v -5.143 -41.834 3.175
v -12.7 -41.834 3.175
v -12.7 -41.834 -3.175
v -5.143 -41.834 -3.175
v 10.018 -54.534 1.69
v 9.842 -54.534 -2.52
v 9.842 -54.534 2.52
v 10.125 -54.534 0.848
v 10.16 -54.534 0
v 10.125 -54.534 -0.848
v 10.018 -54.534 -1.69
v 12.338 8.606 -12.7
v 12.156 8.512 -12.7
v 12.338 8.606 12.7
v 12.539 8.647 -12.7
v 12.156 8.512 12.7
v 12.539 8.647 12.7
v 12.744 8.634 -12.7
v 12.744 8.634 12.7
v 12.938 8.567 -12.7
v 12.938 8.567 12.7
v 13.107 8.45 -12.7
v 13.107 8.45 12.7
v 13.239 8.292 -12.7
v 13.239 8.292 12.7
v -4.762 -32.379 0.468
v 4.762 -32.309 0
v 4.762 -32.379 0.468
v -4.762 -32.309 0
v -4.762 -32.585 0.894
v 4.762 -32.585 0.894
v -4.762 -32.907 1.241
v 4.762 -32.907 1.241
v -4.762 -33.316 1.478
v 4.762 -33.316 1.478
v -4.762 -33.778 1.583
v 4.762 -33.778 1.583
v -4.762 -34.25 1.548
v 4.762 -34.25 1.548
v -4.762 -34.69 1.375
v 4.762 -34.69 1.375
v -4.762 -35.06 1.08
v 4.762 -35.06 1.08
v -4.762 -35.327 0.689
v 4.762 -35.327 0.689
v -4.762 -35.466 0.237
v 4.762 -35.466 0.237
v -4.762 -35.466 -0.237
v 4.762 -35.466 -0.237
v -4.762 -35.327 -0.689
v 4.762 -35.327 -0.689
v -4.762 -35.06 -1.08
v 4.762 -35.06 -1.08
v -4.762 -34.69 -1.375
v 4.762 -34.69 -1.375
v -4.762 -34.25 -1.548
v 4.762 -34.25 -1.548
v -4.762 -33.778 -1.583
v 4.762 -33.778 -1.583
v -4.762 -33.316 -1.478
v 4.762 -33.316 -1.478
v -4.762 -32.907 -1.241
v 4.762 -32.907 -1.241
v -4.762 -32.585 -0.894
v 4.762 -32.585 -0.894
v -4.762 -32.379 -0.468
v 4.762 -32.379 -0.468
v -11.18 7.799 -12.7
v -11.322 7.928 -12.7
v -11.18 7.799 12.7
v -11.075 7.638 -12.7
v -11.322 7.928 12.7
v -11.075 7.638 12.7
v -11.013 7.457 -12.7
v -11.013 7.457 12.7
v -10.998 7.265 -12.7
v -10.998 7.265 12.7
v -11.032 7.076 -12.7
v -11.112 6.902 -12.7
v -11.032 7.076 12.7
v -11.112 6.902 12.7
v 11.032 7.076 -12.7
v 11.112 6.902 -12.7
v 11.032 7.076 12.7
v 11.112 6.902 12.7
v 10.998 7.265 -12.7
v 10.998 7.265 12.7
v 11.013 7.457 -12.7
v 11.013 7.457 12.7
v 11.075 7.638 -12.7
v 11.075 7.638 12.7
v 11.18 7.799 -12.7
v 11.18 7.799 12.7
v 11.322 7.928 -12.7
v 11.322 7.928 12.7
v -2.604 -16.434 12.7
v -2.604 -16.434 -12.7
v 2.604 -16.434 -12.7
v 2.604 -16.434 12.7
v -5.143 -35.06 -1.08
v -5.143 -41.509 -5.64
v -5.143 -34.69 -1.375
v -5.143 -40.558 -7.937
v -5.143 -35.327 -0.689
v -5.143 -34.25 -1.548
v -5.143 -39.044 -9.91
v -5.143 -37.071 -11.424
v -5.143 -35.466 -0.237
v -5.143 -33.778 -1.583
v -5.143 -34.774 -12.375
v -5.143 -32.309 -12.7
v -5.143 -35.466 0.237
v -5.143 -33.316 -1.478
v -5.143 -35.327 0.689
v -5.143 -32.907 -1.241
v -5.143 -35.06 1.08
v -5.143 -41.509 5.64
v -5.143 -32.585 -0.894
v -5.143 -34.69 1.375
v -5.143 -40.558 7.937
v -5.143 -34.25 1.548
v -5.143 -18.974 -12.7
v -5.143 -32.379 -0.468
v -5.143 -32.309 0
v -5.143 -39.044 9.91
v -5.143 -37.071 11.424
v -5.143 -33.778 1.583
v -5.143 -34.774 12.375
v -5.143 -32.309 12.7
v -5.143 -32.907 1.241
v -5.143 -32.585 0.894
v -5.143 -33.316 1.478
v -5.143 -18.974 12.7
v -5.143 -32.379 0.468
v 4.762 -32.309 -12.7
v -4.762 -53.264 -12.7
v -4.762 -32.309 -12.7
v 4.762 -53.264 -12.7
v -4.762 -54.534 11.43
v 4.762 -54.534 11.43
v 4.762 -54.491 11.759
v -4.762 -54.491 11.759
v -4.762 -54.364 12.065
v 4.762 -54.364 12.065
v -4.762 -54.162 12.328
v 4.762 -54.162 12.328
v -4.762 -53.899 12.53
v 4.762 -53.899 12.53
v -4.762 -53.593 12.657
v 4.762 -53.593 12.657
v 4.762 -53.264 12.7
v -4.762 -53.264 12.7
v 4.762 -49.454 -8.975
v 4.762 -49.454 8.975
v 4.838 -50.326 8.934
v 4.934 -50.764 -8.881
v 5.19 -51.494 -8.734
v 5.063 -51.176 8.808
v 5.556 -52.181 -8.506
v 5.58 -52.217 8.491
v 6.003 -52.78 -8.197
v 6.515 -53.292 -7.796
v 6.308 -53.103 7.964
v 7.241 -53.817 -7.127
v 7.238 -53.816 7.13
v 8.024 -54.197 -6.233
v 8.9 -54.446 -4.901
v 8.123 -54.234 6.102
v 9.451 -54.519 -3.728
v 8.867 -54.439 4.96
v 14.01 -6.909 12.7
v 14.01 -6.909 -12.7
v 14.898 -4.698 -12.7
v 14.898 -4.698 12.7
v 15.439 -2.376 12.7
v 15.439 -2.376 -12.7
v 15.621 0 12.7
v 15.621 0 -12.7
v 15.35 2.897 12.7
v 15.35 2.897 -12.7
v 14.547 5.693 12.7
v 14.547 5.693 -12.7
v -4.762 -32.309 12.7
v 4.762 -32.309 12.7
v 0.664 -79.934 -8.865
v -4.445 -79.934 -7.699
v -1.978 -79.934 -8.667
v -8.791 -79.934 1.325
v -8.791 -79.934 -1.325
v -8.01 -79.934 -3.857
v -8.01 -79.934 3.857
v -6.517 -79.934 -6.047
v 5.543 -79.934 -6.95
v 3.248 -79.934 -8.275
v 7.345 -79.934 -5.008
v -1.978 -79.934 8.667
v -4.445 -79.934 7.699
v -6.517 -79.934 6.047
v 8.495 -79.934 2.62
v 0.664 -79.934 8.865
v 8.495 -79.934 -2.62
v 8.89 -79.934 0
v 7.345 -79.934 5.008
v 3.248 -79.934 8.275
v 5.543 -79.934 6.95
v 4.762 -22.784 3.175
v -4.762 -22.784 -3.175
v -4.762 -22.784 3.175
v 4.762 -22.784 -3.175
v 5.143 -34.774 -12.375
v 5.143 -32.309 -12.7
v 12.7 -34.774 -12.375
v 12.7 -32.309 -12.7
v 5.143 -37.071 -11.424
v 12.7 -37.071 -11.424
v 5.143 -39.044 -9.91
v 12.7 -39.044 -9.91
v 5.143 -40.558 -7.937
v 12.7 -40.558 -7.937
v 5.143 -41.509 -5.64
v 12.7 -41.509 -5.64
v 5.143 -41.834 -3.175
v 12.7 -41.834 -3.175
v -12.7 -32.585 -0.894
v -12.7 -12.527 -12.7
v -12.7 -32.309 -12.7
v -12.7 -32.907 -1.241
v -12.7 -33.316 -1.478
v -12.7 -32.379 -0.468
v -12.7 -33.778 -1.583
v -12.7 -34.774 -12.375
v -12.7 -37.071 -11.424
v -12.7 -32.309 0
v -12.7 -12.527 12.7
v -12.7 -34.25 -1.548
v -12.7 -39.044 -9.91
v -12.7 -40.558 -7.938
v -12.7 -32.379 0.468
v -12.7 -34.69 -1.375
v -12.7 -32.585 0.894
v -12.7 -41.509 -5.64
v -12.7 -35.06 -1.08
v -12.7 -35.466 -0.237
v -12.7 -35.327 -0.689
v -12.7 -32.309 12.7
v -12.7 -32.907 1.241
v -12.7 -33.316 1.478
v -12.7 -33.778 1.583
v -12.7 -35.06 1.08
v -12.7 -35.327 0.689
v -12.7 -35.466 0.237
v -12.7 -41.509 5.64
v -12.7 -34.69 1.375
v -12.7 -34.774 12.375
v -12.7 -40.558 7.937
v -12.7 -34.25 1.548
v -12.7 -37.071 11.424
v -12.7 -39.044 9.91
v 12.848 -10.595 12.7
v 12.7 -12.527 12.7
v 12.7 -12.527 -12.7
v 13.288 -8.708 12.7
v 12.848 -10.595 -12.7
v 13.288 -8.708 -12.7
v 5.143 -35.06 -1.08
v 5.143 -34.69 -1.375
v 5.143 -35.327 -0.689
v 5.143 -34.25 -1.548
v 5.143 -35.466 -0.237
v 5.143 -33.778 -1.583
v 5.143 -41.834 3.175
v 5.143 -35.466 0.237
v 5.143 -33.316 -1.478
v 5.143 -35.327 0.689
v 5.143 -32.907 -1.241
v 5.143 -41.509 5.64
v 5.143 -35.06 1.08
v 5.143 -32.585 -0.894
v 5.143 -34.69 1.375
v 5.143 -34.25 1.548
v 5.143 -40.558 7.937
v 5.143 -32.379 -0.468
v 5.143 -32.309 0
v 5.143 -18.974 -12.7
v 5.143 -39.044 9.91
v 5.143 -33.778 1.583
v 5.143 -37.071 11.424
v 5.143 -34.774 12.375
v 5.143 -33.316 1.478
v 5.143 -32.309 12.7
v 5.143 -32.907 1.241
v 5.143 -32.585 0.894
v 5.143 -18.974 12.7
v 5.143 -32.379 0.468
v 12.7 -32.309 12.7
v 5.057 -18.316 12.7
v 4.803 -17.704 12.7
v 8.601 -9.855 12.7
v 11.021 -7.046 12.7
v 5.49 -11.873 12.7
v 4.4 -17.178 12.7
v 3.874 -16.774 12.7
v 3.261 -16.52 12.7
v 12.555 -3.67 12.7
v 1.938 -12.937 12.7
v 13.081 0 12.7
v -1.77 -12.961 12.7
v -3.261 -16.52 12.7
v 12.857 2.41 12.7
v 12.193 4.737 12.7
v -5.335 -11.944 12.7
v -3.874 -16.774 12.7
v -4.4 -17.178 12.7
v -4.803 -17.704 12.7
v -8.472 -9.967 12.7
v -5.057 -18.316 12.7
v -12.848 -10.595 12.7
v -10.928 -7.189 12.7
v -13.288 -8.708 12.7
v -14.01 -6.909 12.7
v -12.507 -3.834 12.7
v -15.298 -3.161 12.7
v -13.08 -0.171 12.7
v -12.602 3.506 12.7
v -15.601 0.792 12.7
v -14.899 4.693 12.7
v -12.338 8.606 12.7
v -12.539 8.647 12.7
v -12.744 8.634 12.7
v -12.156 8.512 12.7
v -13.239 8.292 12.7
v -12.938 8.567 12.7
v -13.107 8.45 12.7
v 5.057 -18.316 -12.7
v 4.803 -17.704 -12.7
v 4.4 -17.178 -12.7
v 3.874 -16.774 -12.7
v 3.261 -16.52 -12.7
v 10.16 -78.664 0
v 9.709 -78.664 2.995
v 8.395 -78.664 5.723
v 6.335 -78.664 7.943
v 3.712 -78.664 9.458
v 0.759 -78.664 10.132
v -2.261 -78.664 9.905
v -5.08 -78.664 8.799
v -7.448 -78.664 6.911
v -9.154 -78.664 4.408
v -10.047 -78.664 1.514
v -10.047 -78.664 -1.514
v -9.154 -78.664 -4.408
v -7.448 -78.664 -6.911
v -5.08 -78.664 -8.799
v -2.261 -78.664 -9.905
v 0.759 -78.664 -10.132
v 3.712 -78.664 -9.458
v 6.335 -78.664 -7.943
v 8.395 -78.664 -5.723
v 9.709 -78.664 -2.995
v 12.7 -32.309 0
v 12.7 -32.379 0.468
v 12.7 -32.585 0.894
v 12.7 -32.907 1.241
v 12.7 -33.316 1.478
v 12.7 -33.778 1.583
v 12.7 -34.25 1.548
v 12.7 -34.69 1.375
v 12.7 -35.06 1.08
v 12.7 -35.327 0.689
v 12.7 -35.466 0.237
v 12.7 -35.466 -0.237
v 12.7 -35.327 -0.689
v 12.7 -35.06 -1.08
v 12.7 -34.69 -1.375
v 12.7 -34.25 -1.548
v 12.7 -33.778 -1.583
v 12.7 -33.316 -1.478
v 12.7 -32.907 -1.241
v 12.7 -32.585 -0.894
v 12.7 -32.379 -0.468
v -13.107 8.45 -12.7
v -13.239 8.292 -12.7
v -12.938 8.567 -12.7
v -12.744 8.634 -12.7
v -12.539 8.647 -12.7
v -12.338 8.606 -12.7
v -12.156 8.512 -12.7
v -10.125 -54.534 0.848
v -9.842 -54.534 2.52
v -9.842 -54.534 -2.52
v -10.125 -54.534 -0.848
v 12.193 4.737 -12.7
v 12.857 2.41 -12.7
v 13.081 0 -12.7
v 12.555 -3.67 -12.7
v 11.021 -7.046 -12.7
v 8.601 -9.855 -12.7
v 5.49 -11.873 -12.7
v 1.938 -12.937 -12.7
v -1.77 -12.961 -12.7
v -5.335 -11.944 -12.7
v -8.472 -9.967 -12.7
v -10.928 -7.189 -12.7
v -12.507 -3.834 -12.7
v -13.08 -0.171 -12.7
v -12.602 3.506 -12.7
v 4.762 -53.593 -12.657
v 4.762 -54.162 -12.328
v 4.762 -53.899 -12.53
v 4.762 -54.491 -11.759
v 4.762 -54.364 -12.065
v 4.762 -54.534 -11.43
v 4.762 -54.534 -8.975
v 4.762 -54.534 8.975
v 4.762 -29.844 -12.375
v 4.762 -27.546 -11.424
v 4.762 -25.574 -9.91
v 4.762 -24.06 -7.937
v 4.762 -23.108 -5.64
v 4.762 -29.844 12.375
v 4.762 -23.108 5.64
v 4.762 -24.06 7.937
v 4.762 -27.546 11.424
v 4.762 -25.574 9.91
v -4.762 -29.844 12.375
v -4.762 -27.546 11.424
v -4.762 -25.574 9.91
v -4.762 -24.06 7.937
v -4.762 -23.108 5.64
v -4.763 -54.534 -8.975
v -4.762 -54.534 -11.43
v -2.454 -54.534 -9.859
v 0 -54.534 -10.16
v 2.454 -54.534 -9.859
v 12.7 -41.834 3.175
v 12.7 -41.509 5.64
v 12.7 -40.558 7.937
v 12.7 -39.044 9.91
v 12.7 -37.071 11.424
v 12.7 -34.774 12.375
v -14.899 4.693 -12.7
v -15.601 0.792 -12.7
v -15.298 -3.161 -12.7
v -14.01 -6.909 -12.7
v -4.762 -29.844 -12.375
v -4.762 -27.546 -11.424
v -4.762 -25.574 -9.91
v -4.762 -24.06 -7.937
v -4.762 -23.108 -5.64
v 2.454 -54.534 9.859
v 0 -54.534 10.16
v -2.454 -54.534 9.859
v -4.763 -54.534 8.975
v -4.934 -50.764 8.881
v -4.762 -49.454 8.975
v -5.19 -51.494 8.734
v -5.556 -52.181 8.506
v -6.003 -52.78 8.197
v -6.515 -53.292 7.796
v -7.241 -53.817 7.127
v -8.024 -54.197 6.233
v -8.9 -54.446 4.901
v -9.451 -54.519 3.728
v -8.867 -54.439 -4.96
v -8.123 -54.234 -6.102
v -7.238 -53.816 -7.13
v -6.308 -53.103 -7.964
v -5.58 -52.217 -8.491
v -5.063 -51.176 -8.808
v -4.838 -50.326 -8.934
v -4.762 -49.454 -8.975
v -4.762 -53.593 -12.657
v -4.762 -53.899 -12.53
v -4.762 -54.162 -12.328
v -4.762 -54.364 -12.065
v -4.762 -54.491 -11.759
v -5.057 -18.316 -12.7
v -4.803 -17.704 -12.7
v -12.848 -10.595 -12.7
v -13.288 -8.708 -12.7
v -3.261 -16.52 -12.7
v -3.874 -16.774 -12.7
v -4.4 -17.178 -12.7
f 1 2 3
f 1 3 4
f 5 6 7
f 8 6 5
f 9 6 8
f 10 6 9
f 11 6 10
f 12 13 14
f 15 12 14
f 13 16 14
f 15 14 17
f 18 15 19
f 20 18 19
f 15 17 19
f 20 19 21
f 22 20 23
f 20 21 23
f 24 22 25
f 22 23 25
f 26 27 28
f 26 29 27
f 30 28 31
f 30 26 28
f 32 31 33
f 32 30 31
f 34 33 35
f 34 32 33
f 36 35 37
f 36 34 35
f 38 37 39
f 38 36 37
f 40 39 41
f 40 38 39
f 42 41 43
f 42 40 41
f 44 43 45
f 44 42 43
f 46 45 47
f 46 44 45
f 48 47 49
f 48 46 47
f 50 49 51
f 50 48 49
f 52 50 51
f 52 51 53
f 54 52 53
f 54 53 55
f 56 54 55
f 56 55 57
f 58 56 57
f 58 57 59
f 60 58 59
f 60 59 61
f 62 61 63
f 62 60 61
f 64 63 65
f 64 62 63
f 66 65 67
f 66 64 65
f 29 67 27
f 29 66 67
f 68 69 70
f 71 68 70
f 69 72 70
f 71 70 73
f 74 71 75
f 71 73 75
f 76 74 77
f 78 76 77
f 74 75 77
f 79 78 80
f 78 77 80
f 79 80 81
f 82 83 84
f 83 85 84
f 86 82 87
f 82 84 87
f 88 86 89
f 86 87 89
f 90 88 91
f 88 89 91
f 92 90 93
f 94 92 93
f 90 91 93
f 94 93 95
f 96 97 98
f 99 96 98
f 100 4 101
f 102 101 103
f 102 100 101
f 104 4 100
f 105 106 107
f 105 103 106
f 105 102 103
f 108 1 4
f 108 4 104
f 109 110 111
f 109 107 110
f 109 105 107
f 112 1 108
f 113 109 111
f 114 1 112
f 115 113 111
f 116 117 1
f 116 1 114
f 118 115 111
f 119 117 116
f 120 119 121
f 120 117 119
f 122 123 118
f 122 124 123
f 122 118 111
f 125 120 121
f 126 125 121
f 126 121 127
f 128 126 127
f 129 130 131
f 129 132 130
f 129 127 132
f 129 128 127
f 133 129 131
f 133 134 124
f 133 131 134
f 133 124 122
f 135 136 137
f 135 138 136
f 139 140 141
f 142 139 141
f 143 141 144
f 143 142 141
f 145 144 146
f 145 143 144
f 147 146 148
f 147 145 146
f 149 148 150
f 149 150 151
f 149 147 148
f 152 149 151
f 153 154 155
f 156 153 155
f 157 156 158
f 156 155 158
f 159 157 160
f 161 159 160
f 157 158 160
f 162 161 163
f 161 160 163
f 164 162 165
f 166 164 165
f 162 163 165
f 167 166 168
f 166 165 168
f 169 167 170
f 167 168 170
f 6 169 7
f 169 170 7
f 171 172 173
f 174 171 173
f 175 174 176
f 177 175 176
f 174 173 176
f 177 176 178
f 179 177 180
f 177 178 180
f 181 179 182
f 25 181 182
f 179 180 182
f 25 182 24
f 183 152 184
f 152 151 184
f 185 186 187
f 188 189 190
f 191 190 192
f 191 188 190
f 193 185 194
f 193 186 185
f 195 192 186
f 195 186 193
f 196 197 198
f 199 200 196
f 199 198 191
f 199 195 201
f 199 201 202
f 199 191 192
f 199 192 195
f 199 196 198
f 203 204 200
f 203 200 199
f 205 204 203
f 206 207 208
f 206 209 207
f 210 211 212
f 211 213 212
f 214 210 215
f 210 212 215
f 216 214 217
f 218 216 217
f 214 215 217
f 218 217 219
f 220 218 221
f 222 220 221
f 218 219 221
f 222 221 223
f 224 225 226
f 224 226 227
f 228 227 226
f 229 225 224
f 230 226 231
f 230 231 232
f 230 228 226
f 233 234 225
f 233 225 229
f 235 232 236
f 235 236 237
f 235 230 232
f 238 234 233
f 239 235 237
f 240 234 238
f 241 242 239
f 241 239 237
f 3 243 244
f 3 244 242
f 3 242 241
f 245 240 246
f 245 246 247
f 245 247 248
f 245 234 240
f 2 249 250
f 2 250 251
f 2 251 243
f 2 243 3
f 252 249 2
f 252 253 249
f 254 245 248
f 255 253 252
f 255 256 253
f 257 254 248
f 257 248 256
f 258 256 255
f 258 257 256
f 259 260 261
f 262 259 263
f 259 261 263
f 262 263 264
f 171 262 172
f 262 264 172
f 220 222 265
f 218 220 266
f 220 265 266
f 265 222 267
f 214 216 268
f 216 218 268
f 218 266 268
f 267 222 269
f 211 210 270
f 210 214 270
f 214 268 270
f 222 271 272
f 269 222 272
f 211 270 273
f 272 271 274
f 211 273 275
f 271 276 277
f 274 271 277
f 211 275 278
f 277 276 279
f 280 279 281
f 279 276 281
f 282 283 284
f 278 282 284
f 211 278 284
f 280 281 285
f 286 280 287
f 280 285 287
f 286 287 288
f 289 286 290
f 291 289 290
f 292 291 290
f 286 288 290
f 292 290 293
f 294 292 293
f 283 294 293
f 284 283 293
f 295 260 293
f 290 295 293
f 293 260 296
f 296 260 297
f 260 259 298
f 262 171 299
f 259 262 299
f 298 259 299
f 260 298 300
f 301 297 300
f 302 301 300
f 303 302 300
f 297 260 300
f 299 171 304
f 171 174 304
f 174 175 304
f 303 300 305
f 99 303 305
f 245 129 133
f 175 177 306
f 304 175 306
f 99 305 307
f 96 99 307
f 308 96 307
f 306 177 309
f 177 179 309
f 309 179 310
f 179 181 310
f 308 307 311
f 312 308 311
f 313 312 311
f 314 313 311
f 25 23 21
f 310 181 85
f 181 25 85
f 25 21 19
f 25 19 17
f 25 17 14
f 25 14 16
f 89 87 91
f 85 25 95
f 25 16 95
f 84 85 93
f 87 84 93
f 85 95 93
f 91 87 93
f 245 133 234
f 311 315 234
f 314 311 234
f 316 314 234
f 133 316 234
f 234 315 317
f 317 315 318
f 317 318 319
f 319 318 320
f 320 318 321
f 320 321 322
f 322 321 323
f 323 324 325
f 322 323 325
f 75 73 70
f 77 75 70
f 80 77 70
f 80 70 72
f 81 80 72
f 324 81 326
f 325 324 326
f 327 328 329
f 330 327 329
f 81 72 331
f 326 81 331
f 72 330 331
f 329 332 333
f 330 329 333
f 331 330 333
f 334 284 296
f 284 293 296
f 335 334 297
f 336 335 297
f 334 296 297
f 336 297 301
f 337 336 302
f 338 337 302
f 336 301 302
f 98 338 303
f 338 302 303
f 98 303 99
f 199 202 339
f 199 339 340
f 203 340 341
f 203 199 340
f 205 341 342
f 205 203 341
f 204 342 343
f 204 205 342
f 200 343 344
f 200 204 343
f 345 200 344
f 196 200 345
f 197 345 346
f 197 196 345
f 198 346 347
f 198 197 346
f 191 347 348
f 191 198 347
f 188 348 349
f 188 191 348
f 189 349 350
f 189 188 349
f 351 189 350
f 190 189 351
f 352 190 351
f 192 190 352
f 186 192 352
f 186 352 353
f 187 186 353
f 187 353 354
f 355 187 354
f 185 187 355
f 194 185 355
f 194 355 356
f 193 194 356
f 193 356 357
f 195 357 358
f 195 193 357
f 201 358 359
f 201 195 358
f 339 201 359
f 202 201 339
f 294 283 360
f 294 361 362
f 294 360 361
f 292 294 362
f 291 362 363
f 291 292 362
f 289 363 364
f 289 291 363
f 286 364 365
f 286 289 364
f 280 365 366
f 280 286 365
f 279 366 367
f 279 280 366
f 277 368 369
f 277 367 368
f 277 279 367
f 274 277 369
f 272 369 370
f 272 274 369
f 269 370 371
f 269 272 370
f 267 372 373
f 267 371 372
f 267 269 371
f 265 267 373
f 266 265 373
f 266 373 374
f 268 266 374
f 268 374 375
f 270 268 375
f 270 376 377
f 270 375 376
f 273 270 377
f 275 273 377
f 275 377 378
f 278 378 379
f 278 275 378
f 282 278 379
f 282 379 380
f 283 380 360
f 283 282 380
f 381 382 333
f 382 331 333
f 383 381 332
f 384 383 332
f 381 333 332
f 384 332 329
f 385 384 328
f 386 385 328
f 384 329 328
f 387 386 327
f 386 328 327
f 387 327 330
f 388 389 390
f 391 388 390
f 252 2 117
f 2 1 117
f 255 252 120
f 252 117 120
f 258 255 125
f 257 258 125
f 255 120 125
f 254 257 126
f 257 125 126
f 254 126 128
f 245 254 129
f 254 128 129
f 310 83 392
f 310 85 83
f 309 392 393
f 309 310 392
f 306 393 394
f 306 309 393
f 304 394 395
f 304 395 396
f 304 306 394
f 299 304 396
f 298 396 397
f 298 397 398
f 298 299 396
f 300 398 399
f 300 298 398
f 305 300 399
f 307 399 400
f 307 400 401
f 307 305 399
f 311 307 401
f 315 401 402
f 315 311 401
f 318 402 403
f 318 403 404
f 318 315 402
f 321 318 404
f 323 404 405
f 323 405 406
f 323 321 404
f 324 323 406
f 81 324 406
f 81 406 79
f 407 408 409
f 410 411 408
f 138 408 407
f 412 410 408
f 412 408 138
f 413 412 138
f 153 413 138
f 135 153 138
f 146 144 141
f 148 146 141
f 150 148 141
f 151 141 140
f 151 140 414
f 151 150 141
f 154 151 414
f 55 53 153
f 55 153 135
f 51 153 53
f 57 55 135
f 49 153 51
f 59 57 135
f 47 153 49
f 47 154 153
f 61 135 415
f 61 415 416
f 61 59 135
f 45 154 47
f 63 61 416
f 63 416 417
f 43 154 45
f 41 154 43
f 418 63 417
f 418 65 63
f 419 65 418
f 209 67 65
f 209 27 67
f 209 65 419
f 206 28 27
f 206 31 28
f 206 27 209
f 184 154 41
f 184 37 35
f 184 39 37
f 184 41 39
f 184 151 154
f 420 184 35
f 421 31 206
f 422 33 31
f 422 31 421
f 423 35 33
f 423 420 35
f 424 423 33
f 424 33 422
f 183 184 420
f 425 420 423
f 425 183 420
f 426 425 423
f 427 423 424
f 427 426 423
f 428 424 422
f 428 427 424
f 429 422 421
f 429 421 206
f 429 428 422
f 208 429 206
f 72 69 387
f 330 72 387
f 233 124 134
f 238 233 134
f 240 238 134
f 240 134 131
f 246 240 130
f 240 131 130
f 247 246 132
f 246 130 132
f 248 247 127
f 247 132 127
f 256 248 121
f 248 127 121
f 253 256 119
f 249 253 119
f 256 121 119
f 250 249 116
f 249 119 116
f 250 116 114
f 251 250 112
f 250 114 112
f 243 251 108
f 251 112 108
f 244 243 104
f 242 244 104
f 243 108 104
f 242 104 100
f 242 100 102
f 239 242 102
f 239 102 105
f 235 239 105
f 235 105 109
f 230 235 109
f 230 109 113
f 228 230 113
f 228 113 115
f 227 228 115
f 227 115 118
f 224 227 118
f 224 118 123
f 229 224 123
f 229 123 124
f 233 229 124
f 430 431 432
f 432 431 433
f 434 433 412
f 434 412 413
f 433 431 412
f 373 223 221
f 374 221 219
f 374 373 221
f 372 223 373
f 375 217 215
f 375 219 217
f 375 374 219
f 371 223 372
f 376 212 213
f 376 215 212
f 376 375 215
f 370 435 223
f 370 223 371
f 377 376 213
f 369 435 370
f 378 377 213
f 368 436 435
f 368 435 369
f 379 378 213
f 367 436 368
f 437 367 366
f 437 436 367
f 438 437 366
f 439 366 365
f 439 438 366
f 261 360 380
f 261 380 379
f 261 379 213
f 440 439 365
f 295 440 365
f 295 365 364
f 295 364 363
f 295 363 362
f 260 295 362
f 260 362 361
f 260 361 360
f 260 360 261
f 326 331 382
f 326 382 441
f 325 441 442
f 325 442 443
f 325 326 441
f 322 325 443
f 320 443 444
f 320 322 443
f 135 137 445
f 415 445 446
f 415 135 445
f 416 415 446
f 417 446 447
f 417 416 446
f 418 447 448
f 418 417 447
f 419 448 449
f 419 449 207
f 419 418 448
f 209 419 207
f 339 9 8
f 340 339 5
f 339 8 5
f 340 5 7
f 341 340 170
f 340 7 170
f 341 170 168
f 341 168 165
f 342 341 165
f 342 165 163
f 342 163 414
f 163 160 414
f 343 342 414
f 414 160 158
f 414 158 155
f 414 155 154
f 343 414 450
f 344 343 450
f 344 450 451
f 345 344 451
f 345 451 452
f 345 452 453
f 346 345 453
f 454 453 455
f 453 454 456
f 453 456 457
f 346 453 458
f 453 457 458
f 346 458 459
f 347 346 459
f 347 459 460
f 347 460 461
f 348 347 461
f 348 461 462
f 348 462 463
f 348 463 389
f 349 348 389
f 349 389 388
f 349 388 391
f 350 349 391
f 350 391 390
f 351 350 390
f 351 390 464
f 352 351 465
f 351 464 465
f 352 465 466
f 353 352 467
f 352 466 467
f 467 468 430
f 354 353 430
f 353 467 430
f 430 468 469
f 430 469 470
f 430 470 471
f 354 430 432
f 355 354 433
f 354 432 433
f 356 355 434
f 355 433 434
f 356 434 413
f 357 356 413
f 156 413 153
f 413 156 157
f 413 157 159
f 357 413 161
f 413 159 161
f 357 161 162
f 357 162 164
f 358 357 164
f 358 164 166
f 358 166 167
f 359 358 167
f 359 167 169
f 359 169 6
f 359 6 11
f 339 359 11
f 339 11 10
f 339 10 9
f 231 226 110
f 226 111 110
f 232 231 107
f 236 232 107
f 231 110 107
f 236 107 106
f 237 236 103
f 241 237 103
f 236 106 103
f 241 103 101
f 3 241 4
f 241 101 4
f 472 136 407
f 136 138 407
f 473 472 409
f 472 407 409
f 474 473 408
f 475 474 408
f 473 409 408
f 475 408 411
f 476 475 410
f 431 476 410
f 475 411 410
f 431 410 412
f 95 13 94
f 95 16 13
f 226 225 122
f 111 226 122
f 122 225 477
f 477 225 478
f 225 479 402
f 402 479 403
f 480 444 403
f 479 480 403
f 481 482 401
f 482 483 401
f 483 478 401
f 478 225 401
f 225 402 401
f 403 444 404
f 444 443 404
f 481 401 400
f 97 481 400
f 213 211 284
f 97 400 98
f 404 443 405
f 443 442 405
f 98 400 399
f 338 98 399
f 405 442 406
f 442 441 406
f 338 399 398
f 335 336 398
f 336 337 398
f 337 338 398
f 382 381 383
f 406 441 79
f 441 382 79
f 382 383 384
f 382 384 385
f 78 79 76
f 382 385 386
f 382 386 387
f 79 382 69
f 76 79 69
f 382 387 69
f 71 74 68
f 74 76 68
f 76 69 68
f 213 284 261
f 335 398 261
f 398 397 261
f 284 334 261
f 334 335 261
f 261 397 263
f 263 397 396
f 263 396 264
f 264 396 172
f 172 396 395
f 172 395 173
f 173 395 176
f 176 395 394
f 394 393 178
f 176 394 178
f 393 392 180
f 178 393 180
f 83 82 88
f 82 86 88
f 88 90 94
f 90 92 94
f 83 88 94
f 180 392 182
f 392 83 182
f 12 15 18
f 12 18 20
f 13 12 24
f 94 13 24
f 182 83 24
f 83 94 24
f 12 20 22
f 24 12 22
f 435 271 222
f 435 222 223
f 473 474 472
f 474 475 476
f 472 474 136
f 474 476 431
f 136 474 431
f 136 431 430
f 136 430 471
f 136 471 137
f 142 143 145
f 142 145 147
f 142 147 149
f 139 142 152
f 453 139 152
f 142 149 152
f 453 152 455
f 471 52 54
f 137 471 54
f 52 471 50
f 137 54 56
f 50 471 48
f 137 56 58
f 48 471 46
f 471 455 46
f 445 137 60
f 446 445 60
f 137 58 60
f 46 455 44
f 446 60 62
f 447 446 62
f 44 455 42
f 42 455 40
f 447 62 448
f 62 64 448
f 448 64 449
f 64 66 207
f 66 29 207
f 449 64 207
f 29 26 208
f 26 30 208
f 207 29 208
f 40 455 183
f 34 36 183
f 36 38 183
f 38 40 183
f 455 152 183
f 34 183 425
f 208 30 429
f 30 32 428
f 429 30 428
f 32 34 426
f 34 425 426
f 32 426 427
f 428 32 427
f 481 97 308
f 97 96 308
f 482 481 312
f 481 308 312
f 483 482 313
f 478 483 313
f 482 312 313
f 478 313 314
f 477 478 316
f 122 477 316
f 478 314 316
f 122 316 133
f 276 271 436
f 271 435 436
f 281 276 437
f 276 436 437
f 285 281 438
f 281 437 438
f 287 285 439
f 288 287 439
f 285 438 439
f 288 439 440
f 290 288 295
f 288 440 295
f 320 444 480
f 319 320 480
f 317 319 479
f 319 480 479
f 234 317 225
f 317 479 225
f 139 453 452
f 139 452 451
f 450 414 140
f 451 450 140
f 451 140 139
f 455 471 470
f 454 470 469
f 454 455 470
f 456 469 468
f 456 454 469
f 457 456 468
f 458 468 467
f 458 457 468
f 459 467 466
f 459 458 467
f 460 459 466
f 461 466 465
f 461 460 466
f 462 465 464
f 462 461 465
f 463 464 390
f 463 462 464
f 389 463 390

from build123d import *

# Parameters (mm, degrees)
F1_DEPTH      = 12.7
F0_W          = 7.5565
F0_H          = 25.4
F2_DEPTH      = 12.7
F3_T1_DEPTH   = 25.4
F3_T3_DEPTH   = 12.7
F3_T5_DEPTH   = 12.7
F4_R          = 0.762
F5_W          = 31.75
F5_H          = 25.4
F5_R          = 1.5875
F6_DEPTH      = 4.7625
F7_DEPTH      = 25.4
F7_DEPTH_BACK = 25.4
F8_R          = 10.16
F9_DEPTH      = 25.4
F10_R         = 9.525
F10_2_R       = 9.525
F11_T4_DEPTH  = 43.3492834119
F11_S5_R      = 10.16
F11_T6_DEPTH  = 23
F11_T10_DEPTH = 43.3492834119
F11_S11_R     = 10.16
F11_T12_DEPTH = 23
F12_R         = 1.27
F13_R         = 2.54
F14_SIZE      = 1.27


# Not quite as in the source:
# - a fillet or chamfer that OpenCascade refuses, or shapes differently, is made with other operations: its cross-section is extruded or revolved along the edge and cut away or added


with BuildPart() as f1:
    # F0 (on Top) → F1 (new body, symmetric)
    with BuildSketch(Plane.XY):
        with BuildLine():
            ThreePointArc((12.7, -9.0953637091), (14.8728333044, -4.7764495705), (15.621, 0))
            ThreePointArc((15.621, 0), (14.8980124876, 4.6973252941), (12.7959740838, 8.9598375122))
            Line((12.7959740838, 8.9598375122), (10.7153278913, 7.5029533639))
            ThreePointArc((10.7153278913, 7.5029533639), (12.4755714327, 3.9335325633), (13.081, 0))
            ThreePointArc((13.081, 0), (-3.9335325633, -12.4755714327), (-10.7153278913, 7.5029533639))
            Line((-10.7153278913, 7.5029533639), (-12.7959740838, 8.9598375122))
            ThreePointArc((-12.7959740838, 8.9598375122), (-15.6207793149, -0.0830336901), (-12.7, -9.0953637091))
            ThreePointArc((-12.7, -9.0953637091), (0, -15.621), (12.7, -9.0953637091))
        make_face()
    extrude(amount=F1_DEPTH, both=True)

    # F0 (on Top) → F2 (join, symmetric)
    with BuildSketch(Plane.XY):
        with BuildLine():
            Line((12.7, -16.4338), (12.7, -9.0953637091))
            ThreePointArc((12.7, -9.0953637091), (0, -15.621), (-12.7, -9.0953637091))
            Line((-12.7, -9.0953637091), (-12.7, -16.4338))
            Line((-12.7, -16.4338), (-5.1435, -16.4338))
            Line((-5.1435, -16.4338), (5.1435, -16.4338))
            Line((5.1435, -16.4338), (12.7, -16.4338))
        make_face()
        with Locations((-8.92175, -29.1338)):
            Rectangle(F0_W, F0_H)
        with Locations((8.92175, -29.1338)):
            Rectangle(F0_W, F0_H)
    extrude(amount=F2_DEPTH, both=True)

    # F3: fillet of radius 12.7 on 3 edges, made by hand

    # F3_s2 → F3_t1 (join)
    with BuildSketch(Plane.XY.offset(-12.7)):
        with BuildLine():
            ThreePointArc((-14.0098654709, -6.9093639714), (-13.0318006864, -9.6427001587), (-12.7, -12.5267330538))
            Line((-12.7, -12.5267330538), (-12.7, -9.0953637091))
            ThreePointArc((-12.7, -9.0953637091), (-13.3995849593, -8.0291197475), (-14.0098654709, -6.9093639714))
        make_face()
    extrude(amount=F3_T1_DEPTH)

    # F3_s4 → F3_t3 (join)
    with BuildSketch(Plane.XY):
        with BuildLine():
            ThreePointArc((14.0098654709, -6.9093639714), (13.0318006864, -9.6427001587), (12.7, -12.5267330538))
            Line((12.7, -12.5267330538), (12.7, -9.0953637091))
            ThreePointArc((12.7, -9.0953637091), (13.3995849593, -8.0291197475), (14.0098654709, -6.9093639714))
        make_face()
    extrude(amount=F3_T3_DEPTH)

    # F3_s6 → F3_t5 (join)
    with BuildSketch(Plane.XY.offset(-12.7)):
        with BuildLine():
            ThreePointArc((12.7, -12.5267330538), (13.0318006864, -9.6427001587), (14.0098654709, -6.9093639714))
            ThreePointArc((14.0098654709, -6.9093639714), (13.3995849593, -8.0291197475), (12.7, -9.0953637091))
            Line((12.7, -9.0953637091), (12.7, -12.5267330538))
        make_face()
    extrude(amount=F3_T5_DEPTH)

    # F4
    f4_edges = [f1.edges().sort_by_distance(p)[0] for p in [
        (-12.795974, 8.959838, 0),
        (-10.715328, 7.502953, -6.35),
        (-10.715328, 7.502953, 6.35),
        (12.795974, 8.959838, 6.35),
        (12.795974, 8.959838, -6.35),
        (10.715328, 7.502953, 6.35),
        (10.715328, 7.502953, -6.35),
    ]]
    fillet(f4_edges, radius=F4_R)

    # F5 (on Right) → F7 (cut, two sides)
    with BuildSketch(Plane.YZ) as f7_sk:
        with Locations((-33.8963, 0)):
            Circle(F5_R)
    extrude(amount=-F7_DEPTH, mode=Mode.SUBTRACT)
    extrude(f7_sk.sketch, amount=F7_DEPTH_BACK, mode=Mode.SUBTRACT)

    # F10
    f10_edges = [f1.edges().sort_by_distance(p)[0] for p in [
        (8.92175, -41.8338, -12.7),
        (-8.92175, -41.8338, -12.7),
        (8.92175, -41.8338, 12.7),
        (-8.92175, -41.8338, 12.7),
    ]]
    fillet(f10_edges, radius=F10_R)

    # F13
    f13_edges = [f1.edges().sort_by_distance(p)[0] for p in [
        (5.1435, -16.4338, 0),
        (-5.1435, -16.4338, 0),
    ]]
    fillet(f13_edges, radius=F13_R)


with BuildPart() as f6:
    # F5 (on Right) → F6 (new body, symmetric)
    with BuildSketch(Plane.YZ):
        with Locations((-38.6588, 0)):
            Rectangle(F5_W, F5_H)
        with Locations((-33.8963, 0)):
            Circle(F5_R, mode=Mode.SUBTRACT)
    extrude(amount=F6_DEPTH, both=True)

    # F8 (on face) → F9 (join)
    with BuildSketch(Plane.XZ.offset(54.5338)):
        Circle(F8_R)
    extrude(amount=F9_DEPTH)

    # F10#2
    f10_2_edges = [f6.edges().sort_by_distance(p)[0] for p in [
        (0, -22.7838, -12.7),
        (0, -22.7838, 12.7),
    ]]
    fillet(f10_2_edges, radius=F10_2_R)

    # F11: fillet of radius 5.08 on 6 edges, made by hand


with BuildPart() as f11_tool2:
    # F11_s3 → F11_t4 (new body)
    with BuildSketch(Plane.XY.offset(21.6746417059)):
        with BuildLine():
            ThreePointArc((-4.7625, -49.4538), (-6.2503975516, -53.0459024484), (-9.8425, -54.5338))
            Line((-9.8425, -54.5338), (-4.7625, -54.5338))
            Line((-4.7625, -54.5338), (-4.7625, -49.4538))
        make_face()
    extrude(amount=-F11_T4_DEPTH)

    # F11_s5 → F11_t6 (intersect, symmetric)
    with BuildSketch(Plane.XZ.offset(52)):
        Circle(F11_S5_R)
    extrude(amount=F11_T6_DEPTH, both=True, mode=Mode.INTERSECT)


with BuildPart() as f6_1:
    add(f6.part)

    # F11_t1: union F11_tool2
    add(f11_tool2.part)


with BuildPart() as f11_tool8:
    # F11_s9 → F11_t10 (new body)
    with BuildSketch(Plane.XY.offset(21.6746417059)):
        with BuildLine():
            ThreePointArc((4.7625, -49.4538), (6.2503975516, -53.0459024484), (9.8425, -54.5338))
            Line((9.8425, -54.5338), (4.7625, -54.5338))
            Line((4.7625, -54.5338), (4.7625, -49.4538))
        make_face()
    extrude(amount=-F11_T10_DEPTH)

    # F11_s11 → F11_t12 (intersect, symmetric)
    with BuildSketch(Plane.XZ.offset(52)):
        Circle(F11_S11_R)
    extrude(amount=F11_T12_DEPTH, both=True, mode=Mode.INTERSECT)


with BuildPart() as f6_2:
    add(f6_1.part)

    # F11_t7: union F11_tool8
    add(f11_tool8.part)

    # F12
    f12_edges = [f6_2.edges().sort_by_distance(p)[0] for p in [
        (0, -54.5338, 12.7),
        (0, -54.5338, -12.7),
    ]]
    fillet(f12_edges, radius=F12_R)

    # F14
    f14_edges = [f6_2.edges().sort_by_distance(p)[0] for p in [
        (-10.16, -79.9338, 0),
    ]]
    chamfer(f14_edges, length=F14_SIZE)


solid = Compound([f1.part, f6_2.part])
